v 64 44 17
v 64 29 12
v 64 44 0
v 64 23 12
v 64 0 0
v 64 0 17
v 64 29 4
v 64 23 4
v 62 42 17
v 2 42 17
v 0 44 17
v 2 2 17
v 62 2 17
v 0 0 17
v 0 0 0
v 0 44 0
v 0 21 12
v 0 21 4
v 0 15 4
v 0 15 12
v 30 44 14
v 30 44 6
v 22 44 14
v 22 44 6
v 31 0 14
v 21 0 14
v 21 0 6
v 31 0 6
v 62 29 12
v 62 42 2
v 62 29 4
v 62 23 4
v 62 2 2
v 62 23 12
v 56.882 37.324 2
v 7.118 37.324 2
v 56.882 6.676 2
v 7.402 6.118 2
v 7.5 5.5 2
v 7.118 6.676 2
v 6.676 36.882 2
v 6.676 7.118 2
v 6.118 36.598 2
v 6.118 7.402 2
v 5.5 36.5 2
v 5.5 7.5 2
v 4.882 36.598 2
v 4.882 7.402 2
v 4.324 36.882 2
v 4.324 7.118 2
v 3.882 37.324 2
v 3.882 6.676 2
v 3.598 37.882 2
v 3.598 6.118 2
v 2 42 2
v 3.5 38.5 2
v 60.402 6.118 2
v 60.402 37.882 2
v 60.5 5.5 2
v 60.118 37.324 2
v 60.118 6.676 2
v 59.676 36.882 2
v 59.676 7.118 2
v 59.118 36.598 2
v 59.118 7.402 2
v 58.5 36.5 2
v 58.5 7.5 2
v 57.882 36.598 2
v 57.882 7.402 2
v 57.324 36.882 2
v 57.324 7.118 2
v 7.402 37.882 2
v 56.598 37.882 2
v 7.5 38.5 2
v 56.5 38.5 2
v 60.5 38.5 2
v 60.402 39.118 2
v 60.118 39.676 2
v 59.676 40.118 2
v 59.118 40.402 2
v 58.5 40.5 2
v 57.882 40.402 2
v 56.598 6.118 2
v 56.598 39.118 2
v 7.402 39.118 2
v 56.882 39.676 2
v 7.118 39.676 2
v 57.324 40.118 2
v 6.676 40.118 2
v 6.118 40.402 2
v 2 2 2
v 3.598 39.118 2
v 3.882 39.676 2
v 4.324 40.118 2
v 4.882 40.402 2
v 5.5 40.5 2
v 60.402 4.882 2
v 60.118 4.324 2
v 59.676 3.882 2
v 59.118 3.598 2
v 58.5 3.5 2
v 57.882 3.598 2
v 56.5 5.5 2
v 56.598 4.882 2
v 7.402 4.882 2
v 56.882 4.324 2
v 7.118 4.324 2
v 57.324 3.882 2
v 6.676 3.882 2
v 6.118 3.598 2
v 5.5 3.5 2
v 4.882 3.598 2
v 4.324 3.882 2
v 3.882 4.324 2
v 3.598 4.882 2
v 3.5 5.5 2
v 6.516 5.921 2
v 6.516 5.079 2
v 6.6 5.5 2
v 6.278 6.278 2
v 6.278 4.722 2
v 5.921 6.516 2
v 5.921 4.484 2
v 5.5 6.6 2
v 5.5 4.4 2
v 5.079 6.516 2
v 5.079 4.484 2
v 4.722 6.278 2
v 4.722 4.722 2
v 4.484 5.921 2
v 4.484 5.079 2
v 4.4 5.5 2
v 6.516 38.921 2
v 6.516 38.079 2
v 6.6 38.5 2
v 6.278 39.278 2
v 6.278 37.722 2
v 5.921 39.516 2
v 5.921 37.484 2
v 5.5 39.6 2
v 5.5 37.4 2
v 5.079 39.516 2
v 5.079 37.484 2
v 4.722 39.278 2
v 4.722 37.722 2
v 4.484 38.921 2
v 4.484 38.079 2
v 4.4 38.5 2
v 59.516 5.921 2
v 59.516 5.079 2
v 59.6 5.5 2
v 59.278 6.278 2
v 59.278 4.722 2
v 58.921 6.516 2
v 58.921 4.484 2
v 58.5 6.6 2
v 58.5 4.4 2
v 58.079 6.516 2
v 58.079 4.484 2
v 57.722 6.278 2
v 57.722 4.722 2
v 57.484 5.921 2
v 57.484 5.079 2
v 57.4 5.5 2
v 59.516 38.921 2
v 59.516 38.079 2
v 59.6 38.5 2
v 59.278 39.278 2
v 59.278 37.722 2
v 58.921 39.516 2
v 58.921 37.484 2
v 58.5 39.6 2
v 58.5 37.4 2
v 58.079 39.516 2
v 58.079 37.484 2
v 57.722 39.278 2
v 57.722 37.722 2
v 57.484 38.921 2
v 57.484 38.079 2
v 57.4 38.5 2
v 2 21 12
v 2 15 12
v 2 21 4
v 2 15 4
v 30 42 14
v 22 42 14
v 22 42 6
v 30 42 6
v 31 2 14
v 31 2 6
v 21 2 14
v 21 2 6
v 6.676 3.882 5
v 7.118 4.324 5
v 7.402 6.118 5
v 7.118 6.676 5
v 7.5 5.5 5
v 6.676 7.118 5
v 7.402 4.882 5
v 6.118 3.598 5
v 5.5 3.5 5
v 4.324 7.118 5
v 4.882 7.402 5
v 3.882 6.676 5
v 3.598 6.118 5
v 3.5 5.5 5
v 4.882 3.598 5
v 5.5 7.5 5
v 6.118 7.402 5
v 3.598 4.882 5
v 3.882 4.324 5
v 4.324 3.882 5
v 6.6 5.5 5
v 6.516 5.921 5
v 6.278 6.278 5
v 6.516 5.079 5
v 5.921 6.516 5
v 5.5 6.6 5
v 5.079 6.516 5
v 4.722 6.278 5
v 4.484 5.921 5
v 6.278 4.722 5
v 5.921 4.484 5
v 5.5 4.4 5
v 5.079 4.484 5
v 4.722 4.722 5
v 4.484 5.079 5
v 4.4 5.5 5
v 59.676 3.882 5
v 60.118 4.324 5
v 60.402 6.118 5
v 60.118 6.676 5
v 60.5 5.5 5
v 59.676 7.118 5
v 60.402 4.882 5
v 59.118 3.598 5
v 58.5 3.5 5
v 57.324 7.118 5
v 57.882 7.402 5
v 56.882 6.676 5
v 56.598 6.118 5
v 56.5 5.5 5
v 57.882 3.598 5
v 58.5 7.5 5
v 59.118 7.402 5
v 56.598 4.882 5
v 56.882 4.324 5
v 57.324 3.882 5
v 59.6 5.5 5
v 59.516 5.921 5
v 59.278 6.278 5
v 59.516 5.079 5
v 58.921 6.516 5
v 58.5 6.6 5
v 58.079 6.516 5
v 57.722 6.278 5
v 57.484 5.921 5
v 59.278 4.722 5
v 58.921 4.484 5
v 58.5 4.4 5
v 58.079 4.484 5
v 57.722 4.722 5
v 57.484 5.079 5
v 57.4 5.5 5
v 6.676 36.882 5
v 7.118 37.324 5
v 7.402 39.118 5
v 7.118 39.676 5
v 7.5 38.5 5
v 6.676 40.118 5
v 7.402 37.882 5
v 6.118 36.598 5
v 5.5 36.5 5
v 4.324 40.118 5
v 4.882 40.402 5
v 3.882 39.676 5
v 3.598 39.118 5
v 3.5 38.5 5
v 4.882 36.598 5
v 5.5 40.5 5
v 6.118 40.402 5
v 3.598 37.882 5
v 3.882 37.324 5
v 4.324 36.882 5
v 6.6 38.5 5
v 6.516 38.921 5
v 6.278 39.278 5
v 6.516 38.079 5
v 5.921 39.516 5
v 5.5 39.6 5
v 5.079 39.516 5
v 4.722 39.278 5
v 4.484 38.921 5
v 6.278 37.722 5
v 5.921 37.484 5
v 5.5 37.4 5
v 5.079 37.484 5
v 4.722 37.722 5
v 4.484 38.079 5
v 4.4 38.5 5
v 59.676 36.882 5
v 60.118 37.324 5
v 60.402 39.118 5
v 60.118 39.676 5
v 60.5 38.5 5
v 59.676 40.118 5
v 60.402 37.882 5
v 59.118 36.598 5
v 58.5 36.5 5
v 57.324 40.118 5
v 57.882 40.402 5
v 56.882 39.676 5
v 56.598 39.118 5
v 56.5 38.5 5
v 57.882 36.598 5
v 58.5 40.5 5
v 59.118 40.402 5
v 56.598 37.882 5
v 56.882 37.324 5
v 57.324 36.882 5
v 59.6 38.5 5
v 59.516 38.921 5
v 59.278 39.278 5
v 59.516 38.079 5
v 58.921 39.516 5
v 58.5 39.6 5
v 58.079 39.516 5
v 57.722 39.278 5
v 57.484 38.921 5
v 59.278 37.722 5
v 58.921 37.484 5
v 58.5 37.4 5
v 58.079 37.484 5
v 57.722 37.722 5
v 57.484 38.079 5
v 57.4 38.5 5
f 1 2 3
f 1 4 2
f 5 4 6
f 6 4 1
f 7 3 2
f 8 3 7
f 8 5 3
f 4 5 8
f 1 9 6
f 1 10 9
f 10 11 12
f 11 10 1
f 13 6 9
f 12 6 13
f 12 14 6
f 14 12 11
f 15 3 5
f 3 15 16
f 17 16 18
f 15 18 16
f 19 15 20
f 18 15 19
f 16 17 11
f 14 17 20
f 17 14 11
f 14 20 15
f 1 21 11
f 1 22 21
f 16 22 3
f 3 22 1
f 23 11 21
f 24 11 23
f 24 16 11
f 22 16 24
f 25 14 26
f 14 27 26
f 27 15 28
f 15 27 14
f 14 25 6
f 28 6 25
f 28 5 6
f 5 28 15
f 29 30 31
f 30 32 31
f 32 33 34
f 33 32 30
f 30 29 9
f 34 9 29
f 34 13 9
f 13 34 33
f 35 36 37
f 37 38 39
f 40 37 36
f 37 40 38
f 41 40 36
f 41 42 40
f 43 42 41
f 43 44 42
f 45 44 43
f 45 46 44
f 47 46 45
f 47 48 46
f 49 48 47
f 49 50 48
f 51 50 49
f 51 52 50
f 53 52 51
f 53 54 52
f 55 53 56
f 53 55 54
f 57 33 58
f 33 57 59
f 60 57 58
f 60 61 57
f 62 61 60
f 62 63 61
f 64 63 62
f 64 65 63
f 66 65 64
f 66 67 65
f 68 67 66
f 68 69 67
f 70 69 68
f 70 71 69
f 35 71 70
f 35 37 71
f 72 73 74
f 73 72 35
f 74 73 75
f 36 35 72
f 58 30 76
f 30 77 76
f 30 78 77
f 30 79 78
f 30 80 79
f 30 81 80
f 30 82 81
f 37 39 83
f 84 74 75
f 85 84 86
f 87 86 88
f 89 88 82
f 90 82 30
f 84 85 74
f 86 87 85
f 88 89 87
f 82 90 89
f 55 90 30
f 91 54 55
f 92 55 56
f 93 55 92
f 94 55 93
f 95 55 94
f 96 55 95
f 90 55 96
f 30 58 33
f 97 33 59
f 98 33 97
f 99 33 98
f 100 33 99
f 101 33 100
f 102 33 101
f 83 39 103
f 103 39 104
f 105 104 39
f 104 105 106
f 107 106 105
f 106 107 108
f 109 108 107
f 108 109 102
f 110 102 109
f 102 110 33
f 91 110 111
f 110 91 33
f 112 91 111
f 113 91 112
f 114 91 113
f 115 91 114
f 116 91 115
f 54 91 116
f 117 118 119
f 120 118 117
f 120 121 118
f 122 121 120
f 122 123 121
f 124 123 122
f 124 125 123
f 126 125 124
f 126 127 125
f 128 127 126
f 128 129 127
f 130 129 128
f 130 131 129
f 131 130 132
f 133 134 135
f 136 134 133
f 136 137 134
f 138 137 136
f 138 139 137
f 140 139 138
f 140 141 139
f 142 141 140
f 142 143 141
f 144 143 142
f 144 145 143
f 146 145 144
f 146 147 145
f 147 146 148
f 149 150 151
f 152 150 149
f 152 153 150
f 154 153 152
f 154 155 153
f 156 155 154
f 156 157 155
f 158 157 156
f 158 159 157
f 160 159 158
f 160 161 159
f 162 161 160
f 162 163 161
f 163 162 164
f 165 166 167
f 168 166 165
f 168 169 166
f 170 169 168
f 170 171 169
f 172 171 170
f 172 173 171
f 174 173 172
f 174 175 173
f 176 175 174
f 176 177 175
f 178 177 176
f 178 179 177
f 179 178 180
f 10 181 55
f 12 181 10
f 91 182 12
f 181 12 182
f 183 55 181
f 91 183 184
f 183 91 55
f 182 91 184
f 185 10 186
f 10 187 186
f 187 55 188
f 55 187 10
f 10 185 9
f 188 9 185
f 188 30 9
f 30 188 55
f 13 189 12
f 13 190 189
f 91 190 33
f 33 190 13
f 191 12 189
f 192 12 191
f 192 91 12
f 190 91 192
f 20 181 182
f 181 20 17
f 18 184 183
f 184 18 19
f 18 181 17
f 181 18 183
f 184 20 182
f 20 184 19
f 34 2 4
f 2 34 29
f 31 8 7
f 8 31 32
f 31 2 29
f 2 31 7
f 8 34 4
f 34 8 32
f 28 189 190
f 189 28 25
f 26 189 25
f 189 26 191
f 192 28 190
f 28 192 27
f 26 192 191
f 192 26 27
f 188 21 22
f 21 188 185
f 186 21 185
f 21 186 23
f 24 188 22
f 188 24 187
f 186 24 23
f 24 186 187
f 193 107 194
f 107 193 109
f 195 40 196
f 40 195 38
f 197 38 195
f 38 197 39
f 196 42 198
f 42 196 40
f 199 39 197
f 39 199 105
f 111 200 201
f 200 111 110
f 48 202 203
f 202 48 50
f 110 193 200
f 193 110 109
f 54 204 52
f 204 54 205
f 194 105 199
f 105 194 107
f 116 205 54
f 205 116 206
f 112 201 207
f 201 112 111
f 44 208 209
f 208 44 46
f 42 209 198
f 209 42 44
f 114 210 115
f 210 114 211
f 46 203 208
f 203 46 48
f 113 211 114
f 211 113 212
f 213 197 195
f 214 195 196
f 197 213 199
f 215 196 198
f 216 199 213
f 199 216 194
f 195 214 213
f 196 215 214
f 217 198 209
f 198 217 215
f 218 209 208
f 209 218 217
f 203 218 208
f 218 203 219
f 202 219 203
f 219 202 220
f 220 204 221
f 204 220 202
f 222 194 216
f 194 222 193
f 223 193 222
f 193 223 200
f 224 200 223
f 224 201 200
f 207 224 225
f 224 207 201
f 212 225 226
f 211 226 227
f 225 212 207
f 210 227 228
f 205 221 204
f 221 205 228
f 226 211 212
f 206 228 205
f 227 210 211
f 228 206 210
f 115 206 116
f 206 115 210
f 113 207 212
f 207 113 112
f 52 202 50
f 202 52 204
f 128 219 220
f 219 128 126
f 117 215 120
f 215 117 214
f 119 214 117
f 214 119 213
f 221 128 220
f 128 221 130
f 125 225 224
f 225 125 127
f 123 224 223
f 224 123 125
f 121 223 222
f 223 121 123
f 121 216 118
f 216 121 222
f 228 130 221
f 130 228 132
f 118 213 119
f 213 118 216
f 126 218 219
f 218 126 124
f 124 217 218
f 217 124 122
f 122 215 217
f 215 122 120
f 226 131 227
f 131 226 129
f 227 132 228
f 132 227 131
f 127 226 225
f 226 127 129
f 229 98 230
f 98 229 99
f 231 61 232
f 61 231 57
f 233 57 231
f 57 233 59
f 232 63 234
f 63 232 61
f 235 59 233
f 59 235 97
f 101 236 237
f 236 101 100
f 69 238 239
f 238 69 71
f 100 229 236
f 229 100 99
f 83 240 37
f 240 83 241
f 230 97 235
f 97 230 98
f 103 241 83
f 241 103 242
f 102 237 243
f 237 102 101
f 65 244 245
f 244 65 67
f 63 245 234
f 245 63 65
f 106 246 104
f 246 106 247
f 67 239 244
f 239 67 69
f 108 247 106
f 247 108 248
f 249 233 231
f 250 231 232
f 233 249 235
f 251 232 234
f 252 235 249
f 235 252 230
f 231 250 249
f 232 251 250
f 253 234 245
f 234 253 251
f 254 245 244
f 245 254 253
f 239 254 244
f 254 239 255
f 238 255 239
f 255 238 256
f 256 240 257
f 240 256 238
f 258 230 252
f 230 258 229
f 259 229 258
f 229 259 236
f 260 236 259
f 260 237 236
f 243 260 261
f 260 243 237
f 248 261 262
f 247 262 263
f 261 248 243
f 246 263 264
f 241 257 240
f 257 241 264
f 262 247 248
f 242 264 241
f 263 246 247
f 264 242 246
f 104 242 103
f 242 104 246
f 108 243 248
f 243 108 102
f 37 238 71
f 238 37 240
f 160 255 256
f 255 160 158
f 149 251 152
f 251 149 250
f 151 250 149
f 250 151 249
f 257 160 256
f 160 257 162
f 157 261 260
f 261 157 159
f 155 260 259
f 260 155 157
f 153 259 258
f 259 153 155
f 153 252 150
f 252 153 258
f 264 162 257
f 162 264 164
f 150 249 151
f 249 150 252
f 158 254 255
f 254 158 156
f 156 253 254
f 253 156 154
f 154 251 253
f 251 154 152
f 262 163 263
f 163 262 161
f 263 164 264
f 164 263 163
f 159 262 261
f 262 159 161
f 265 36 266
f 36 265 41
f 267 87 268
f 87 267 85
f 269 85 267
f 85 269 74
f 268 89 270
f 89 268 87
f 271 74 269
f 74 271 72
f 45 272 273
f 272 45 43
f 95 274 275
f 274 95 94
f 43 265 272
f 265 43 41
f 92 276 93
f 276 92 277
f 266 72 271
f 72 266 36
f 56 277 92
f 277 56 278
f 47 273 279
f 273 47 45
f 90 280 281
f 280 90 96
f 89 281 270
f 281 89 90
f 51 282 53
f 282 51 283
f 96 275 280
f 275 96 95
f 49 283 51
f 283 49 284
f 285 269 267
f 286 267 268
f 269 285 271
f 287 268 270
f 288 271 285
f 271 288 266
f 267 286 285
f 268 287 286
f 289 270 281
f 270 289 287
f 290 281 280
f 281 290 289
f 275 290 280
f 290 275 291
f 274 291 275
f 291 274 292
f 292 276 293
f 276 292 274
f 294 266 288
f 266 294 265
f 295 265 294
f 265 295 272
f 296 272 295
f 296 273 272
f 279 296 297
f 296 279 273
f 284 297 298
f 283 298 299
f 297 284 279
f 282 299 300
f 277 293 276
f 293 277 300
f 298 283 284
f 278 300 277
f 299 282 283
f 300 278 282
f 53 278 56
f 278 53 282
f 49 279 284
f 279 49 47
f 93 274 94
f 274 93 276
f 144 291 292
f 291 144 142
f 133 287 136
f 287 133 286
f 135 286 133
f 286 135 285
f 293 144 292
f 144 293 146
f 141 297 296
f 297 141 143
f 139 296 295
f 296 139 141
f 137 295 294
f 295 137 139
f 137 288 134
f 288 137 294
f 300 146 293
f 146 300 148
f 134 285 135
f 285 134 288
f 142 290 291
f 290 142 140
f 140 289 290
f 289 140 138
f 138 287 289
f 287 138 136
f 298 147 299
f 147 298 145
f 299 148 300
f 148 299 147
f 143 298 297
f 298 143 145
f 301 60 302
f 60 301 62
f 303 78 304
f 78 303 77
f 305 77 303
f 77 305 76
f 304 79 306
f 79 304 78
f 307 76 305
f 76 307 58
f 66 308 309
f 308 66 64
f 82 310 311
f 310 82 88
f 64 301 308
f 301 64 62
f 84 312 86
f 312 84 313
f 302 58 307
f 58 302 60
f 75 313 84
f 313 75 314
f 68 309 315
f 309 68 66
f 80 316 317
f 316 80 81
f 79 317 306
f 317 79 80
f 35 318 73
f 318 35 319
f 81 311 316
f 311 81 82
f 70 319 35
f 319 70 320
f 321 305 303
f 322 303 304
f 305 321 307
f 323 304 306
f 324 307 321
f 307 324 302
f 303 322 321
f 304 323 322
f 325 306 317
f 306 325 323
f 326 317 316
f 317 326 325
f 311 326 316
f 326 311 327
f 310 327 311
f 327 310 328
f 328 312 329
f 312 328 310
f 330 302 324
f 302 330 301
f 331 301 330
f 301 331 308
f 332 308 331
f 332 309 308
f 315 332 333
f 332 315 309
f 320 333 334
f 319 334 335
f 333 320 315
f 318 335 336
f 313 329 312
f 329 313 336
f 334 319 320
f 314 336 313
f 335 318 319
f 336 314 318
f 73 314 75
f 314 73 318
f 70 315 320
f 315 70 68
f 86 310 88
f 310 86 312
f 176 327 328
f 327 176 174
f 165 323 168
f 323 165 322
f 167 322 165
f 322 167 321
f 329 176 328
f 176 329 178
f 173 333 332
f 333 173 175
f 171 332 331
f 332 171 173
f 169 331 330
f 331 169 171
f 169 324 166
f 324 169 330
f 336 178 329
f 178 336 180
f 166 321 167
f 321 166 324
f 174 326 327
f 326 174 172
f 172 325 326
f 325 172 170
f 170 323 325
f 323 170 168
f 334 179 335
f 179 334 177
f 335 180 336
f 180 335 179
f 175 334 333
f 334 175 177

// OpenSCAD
// SPDX-FileCopyrightText: 2026 Mummana Jagadeesh
// SPDX-License-Identifier: Apache-2.0
//
// FIR Accelerator Breakout Board Enclosure
// PCB dimensions: 60mm x 40mm
// Designed for FDM 3D printing (PLA/PETG)

// Parameters
pcb_x = 60;
pcb_y = 40;
pcb_z = 1.6;
wall  = 2.0;
floor = 2.0;
lid_h = 3.0;
inner_h = 15.0;  // tall enough for connectors/headers
post_r = 2.0;
post_h = 3.0;
screw_r = 1.1;   // M2.2 self-tap

// Mounting hole positions (3mm from corners)
mh_offset = 3.5;
mh_pos = [
    [mh_offset,       mh_offset      ],
    [pcb_x-mh_offset, mh_offset      ],
    [mh_offset,       pcb_y-mh_offset],
    [pcb_x-mh_offset, pcb_y-mh_offset]
];

module mounting_post(h) {
    difference() {
        cylinder(r=post_r, h=h, $fn=20);
        cylinder(r=screw_r, h=h+1, $fn=16);
    }
}

module base() {
    difference() {
        // Outer shell
        cube([pcb_x + 2*wall, pcb_y + 2*wall, floor + inner_h]);
        // Inner cavity
        translate([wall, wall, floor])
            cube([pcb_x, pcb_y, inner_h + 1]);
        // GPIO[8] input slot - left side
        translate([0, pcb_y*0.4 + wall - 3, floor + 2])
            cube([wall + 1, 6, 8]);
        // GPIO[9] output slot - right side
        translate([pcb_x + wall - 0.5, pcb_y*0.6 + wall - 3, floor + 2])
            cube([wall + 1, 6, 8]);
        // UART header cutout - front
        translate([pcb_x*0.4 + wall - 5, 0, floor + 4])
            cube([10, wall + 1, 8]);
        // Power connector cutout - back
        translate([pcb_x*0.4 + wall - 4, pcb_y + wall - 0.5, floor + 4])
            cube([8, wall + 1, 8]);
    }
    // Mounting posts
    for (p = mh_pos) {
        translate([p[0] + wall, p[1] + wall, floor])
            mounting_post(post_h);
    }
}

module lid() {
    difference() {
        cube([pcb_x + 2*wall, pcb_y + 2*wall, lid_h]);
        // Label recess
        translate([wall + 5, wall + 5, lid_h - 0.8])
            linear_extrude(1)
                text("FIR SoC", size=5, font="Liberation Sans:style=Bold");
        // Ventilation slots
        for (i = [0:3]) {
            translate([wall + 8 + i*12, wall + pcb_y/2 - 5, -0.1])
                cube([6, 10, lid_h + 0.2]);
        }
    }
}

// Render base by default
// Use: openscad -D 'part="lid"' to render lid
part = "base"; // override with -D 'part="lid"'

if (part == "base") {
    base();
} else if (part == "lid") {
    lid();
} else {
    // Show both for preview
    base();
    translate([0, pcb_y + 2*wall + 5, 0])
        lid();
}
